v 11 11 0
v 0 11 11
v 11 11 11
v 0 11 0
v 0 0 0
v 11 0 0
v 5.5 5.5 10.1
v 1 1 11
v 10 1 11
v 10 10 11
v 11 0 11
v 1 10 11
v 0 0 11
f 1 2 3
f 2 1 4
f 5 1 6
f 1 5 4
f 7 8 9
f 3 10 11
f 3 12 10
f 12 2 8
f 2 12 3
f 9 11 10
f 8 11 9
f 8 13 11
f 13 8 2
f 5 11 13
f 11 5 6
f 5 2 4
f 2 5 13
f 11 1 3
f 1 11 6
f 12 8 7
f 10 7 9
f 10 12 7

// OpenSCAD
minkowski() {
    polyhedron(faces=[[4,5,6,7],[3,2,5,4],[2,1,6,5],[1,0,7,6],[0,3,4,7],
        [0,8,3],
        [1,2,9],
        [0,1,9,8],
        [2,3,8,9]],
        points=[[0,10,10],[10,10,10],[10,0,10],[0,0,10],[0,0,0],[10,0,0],[10,10,0],[0,10,0],
        [4.9999999,5,9],[5.0000001,5,9]]);
    polyhedron(faces=[[0,1,2,3],[4,5,6,7],[3,2,5,4],[2,1,6,5],[1,0,7,6],[0,3,4,7]],
        points=[[0,1,1],[1,1,1],[1,0,1],[0,0,1],[0,0,0],[1,0,0],[1,1,0],[0,1,0]]);
}
